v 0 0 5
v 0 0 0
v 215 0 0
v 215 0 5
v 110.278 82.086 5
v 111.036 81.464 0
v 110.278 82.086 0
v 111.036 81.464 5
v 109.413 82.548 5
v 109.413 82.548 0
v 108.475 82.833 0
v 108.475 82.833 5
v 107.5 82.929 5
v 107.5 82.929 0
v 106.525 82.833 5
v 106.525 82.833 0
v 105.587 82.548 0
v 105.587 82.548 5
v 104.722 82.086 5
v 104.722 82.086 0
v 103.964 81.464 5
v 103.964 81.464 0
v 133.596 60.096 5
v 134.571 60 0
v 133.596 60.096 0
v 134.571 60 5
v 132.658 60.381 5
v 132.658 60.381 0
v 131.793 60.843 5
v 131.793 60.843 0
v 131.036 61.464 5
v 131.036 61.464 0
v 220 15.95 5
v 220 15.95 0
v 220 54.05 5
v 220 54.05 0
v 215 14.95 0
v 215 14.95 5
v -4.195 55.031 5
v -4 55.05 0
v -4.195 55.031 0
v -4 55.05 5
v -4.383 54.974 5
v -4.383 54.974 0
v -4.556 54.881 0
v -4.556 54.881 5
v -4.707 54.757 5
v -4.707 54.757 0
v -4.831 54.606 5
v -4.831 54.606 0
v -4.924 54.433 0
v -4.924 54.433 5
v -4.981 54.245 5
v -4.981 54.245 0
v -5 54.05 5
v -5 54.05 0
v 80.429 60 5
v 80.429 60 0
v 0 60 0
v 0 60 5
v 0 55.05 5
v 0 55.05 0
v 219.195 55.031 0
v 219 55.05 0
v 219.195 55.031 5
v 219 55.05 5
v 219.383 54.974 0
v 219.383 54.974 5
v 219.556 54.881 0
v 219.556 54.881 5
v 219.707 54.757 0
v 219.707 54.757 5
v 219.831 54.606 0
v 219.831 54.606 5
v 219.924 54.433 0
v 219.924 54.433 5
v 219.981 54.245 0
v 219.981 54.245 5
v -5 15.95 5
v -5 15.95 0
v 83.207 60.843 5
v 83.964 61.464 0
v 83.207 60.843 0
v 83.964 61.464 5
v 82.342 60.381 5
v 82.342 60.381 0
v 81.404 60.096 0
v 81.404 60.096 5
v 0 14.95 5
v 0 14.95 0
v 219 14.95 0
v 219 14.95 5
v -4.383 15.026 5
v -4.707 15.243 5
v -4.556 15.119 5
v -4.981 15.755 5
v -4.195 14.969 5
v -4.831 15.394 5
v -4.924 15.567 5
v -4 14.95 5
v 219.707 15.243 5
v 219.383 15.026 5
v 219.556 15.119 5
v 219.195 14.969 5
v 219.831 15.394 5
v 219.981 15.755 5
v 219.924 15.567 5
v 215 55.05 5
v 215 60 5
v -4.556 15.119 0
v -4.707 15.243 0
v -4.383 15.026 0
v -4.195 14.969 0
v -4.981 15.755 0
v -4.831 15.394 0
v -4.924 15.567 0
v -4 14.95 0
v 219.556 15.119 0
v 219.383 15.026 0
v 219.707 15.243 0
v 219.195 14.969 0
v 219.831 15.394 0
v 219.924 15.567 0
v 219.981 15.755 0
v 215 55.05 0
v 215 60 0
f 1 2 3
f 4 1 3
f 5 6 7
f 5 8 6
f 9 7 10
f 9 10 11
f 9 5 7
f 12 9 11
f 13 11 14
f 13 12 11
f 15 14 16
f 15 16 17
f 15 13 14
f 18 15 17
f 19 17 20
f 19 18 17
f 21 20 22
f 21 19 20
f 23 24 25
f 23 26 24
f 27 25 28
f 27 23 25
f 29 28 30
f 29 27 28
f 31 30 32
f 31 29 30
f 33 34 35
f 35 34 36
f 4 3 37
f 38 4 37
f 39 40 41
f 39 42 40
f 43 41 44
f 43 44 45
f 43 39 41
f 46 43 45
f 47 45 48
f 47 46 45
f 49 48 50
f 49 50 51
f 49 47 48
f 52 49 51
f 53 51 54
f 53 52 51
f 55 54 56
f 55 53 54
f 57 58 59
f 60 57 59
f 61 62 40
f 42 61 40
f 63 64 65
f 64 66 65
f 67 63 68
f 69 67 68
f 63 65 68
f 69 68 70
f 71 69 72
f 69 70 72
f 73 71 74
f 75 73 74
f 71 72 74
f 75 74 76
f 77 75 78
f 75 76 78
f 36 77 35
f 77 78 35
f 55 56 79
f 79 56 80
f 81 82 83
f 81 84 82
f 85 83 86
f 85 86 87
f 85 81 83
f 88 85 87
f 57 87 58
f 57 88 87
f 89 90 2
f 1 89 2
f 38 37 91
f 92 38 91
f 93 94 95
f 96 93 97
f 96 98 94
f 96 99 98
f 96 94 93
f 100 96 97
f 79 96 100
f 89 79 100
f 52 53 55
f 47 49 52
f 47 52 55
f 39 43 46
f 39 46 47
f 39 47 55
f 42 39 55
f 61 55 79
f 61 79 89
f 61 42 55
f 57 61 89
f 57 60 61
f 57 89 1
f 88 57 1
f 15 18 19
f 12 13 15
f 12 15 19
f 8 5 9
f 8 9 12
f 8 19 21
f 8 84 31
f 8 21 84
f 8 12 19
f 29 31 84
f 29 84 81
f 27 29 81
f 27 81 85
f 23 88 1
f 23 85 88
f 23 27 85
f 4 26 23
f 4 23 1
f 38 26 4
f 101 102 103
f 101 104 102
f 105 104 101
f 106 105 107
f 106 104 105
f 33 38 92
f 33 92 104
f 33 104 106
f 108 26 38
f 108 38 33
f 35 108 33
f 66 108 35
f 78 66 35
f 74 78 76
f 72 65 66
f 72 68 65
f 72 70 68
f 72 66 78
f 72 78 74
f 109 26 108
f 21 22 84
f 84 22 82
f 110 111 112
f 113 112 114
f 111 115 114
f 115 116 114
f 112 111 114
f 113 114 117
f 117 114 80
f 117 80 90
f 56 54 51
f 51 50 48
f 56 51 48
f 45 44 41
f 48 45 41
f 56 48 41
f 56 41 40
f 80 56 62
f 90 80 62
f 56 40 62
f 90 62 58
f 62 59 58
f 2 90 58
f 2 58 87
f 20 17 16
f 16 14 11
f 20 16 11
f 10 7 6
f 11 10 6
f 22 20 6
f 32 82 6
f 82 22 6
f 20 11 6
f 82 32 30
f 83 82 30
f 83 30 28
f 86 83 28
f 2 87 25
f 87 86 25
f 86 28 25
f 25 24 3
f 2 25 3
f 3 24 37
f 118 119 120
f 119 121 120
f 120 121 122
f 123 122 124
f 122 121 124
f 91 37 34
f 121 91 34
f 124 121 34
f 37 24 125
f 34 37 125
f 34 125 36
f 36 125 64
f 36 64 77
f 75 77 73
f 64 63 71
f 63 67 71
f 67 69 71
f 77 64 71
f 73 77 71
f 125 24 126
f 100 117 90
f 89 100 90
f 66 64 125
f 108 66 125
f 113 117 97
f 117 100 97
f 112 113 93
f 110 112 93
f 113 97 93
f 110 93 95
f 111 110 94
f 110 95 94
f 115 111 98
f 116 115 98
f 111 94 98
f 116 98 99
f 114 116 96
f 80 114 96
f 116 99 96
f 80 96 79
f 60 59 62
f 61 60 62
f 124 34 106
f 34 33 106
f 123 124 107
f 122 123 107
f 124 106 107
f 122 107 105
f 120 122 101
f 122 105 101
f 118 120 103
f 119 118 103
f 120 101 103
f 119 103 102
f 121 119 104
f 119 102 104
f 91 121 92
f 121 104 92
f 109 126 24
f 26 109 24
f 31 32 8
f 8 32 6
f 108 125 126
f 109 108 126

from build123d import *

# Parameters (mm, degrees)
BOSS_EXTRUDE1_DEPTH = 5
FILLET1_R           = 5
FILLET2_R           = 1


with BuildPart() as part:
    # Sketch1 → Boss-Extrude1 (new body)
    with BuildSketch(Plane.XY):
        Polygon((215, 55.05), (215, 60), (132.5, 60), (107.5, 85), (82.5, 60), (0, 60), (0, 55.05), (-5, 55.05), (-5, 14.95), (0, 14.95), (0, 0), (215, 0), (215, 14.95), (220, 14.95), (220, 55.05), align=None)
    extrude(amount=BOSS_EXTRUDE1_DEPTH)

    # Fillet1
    fillet1_edges = [part.edges().sort_by_distance(p)[0] for p in [
        (82.5, 60, 2.5),
        (107.5, 85, 2.5),
        (132.5, 60, 2.5),
    ]]
    fillet(fillet1_edges, radius=FILLET1_R)

    # Fillet2
    fillet2_edges = [part.edges().sort_by_distance(p)[0] for p in [
        (-5, 14.95, 2.5),
        (-5, 55.05, 2.5),
        (220, 55.05, 2.5),
        (220, 14.95, 2.5),
    ]]
    fillet(fillet2_edges, radius=FILLET2_R)


solid = part.part
